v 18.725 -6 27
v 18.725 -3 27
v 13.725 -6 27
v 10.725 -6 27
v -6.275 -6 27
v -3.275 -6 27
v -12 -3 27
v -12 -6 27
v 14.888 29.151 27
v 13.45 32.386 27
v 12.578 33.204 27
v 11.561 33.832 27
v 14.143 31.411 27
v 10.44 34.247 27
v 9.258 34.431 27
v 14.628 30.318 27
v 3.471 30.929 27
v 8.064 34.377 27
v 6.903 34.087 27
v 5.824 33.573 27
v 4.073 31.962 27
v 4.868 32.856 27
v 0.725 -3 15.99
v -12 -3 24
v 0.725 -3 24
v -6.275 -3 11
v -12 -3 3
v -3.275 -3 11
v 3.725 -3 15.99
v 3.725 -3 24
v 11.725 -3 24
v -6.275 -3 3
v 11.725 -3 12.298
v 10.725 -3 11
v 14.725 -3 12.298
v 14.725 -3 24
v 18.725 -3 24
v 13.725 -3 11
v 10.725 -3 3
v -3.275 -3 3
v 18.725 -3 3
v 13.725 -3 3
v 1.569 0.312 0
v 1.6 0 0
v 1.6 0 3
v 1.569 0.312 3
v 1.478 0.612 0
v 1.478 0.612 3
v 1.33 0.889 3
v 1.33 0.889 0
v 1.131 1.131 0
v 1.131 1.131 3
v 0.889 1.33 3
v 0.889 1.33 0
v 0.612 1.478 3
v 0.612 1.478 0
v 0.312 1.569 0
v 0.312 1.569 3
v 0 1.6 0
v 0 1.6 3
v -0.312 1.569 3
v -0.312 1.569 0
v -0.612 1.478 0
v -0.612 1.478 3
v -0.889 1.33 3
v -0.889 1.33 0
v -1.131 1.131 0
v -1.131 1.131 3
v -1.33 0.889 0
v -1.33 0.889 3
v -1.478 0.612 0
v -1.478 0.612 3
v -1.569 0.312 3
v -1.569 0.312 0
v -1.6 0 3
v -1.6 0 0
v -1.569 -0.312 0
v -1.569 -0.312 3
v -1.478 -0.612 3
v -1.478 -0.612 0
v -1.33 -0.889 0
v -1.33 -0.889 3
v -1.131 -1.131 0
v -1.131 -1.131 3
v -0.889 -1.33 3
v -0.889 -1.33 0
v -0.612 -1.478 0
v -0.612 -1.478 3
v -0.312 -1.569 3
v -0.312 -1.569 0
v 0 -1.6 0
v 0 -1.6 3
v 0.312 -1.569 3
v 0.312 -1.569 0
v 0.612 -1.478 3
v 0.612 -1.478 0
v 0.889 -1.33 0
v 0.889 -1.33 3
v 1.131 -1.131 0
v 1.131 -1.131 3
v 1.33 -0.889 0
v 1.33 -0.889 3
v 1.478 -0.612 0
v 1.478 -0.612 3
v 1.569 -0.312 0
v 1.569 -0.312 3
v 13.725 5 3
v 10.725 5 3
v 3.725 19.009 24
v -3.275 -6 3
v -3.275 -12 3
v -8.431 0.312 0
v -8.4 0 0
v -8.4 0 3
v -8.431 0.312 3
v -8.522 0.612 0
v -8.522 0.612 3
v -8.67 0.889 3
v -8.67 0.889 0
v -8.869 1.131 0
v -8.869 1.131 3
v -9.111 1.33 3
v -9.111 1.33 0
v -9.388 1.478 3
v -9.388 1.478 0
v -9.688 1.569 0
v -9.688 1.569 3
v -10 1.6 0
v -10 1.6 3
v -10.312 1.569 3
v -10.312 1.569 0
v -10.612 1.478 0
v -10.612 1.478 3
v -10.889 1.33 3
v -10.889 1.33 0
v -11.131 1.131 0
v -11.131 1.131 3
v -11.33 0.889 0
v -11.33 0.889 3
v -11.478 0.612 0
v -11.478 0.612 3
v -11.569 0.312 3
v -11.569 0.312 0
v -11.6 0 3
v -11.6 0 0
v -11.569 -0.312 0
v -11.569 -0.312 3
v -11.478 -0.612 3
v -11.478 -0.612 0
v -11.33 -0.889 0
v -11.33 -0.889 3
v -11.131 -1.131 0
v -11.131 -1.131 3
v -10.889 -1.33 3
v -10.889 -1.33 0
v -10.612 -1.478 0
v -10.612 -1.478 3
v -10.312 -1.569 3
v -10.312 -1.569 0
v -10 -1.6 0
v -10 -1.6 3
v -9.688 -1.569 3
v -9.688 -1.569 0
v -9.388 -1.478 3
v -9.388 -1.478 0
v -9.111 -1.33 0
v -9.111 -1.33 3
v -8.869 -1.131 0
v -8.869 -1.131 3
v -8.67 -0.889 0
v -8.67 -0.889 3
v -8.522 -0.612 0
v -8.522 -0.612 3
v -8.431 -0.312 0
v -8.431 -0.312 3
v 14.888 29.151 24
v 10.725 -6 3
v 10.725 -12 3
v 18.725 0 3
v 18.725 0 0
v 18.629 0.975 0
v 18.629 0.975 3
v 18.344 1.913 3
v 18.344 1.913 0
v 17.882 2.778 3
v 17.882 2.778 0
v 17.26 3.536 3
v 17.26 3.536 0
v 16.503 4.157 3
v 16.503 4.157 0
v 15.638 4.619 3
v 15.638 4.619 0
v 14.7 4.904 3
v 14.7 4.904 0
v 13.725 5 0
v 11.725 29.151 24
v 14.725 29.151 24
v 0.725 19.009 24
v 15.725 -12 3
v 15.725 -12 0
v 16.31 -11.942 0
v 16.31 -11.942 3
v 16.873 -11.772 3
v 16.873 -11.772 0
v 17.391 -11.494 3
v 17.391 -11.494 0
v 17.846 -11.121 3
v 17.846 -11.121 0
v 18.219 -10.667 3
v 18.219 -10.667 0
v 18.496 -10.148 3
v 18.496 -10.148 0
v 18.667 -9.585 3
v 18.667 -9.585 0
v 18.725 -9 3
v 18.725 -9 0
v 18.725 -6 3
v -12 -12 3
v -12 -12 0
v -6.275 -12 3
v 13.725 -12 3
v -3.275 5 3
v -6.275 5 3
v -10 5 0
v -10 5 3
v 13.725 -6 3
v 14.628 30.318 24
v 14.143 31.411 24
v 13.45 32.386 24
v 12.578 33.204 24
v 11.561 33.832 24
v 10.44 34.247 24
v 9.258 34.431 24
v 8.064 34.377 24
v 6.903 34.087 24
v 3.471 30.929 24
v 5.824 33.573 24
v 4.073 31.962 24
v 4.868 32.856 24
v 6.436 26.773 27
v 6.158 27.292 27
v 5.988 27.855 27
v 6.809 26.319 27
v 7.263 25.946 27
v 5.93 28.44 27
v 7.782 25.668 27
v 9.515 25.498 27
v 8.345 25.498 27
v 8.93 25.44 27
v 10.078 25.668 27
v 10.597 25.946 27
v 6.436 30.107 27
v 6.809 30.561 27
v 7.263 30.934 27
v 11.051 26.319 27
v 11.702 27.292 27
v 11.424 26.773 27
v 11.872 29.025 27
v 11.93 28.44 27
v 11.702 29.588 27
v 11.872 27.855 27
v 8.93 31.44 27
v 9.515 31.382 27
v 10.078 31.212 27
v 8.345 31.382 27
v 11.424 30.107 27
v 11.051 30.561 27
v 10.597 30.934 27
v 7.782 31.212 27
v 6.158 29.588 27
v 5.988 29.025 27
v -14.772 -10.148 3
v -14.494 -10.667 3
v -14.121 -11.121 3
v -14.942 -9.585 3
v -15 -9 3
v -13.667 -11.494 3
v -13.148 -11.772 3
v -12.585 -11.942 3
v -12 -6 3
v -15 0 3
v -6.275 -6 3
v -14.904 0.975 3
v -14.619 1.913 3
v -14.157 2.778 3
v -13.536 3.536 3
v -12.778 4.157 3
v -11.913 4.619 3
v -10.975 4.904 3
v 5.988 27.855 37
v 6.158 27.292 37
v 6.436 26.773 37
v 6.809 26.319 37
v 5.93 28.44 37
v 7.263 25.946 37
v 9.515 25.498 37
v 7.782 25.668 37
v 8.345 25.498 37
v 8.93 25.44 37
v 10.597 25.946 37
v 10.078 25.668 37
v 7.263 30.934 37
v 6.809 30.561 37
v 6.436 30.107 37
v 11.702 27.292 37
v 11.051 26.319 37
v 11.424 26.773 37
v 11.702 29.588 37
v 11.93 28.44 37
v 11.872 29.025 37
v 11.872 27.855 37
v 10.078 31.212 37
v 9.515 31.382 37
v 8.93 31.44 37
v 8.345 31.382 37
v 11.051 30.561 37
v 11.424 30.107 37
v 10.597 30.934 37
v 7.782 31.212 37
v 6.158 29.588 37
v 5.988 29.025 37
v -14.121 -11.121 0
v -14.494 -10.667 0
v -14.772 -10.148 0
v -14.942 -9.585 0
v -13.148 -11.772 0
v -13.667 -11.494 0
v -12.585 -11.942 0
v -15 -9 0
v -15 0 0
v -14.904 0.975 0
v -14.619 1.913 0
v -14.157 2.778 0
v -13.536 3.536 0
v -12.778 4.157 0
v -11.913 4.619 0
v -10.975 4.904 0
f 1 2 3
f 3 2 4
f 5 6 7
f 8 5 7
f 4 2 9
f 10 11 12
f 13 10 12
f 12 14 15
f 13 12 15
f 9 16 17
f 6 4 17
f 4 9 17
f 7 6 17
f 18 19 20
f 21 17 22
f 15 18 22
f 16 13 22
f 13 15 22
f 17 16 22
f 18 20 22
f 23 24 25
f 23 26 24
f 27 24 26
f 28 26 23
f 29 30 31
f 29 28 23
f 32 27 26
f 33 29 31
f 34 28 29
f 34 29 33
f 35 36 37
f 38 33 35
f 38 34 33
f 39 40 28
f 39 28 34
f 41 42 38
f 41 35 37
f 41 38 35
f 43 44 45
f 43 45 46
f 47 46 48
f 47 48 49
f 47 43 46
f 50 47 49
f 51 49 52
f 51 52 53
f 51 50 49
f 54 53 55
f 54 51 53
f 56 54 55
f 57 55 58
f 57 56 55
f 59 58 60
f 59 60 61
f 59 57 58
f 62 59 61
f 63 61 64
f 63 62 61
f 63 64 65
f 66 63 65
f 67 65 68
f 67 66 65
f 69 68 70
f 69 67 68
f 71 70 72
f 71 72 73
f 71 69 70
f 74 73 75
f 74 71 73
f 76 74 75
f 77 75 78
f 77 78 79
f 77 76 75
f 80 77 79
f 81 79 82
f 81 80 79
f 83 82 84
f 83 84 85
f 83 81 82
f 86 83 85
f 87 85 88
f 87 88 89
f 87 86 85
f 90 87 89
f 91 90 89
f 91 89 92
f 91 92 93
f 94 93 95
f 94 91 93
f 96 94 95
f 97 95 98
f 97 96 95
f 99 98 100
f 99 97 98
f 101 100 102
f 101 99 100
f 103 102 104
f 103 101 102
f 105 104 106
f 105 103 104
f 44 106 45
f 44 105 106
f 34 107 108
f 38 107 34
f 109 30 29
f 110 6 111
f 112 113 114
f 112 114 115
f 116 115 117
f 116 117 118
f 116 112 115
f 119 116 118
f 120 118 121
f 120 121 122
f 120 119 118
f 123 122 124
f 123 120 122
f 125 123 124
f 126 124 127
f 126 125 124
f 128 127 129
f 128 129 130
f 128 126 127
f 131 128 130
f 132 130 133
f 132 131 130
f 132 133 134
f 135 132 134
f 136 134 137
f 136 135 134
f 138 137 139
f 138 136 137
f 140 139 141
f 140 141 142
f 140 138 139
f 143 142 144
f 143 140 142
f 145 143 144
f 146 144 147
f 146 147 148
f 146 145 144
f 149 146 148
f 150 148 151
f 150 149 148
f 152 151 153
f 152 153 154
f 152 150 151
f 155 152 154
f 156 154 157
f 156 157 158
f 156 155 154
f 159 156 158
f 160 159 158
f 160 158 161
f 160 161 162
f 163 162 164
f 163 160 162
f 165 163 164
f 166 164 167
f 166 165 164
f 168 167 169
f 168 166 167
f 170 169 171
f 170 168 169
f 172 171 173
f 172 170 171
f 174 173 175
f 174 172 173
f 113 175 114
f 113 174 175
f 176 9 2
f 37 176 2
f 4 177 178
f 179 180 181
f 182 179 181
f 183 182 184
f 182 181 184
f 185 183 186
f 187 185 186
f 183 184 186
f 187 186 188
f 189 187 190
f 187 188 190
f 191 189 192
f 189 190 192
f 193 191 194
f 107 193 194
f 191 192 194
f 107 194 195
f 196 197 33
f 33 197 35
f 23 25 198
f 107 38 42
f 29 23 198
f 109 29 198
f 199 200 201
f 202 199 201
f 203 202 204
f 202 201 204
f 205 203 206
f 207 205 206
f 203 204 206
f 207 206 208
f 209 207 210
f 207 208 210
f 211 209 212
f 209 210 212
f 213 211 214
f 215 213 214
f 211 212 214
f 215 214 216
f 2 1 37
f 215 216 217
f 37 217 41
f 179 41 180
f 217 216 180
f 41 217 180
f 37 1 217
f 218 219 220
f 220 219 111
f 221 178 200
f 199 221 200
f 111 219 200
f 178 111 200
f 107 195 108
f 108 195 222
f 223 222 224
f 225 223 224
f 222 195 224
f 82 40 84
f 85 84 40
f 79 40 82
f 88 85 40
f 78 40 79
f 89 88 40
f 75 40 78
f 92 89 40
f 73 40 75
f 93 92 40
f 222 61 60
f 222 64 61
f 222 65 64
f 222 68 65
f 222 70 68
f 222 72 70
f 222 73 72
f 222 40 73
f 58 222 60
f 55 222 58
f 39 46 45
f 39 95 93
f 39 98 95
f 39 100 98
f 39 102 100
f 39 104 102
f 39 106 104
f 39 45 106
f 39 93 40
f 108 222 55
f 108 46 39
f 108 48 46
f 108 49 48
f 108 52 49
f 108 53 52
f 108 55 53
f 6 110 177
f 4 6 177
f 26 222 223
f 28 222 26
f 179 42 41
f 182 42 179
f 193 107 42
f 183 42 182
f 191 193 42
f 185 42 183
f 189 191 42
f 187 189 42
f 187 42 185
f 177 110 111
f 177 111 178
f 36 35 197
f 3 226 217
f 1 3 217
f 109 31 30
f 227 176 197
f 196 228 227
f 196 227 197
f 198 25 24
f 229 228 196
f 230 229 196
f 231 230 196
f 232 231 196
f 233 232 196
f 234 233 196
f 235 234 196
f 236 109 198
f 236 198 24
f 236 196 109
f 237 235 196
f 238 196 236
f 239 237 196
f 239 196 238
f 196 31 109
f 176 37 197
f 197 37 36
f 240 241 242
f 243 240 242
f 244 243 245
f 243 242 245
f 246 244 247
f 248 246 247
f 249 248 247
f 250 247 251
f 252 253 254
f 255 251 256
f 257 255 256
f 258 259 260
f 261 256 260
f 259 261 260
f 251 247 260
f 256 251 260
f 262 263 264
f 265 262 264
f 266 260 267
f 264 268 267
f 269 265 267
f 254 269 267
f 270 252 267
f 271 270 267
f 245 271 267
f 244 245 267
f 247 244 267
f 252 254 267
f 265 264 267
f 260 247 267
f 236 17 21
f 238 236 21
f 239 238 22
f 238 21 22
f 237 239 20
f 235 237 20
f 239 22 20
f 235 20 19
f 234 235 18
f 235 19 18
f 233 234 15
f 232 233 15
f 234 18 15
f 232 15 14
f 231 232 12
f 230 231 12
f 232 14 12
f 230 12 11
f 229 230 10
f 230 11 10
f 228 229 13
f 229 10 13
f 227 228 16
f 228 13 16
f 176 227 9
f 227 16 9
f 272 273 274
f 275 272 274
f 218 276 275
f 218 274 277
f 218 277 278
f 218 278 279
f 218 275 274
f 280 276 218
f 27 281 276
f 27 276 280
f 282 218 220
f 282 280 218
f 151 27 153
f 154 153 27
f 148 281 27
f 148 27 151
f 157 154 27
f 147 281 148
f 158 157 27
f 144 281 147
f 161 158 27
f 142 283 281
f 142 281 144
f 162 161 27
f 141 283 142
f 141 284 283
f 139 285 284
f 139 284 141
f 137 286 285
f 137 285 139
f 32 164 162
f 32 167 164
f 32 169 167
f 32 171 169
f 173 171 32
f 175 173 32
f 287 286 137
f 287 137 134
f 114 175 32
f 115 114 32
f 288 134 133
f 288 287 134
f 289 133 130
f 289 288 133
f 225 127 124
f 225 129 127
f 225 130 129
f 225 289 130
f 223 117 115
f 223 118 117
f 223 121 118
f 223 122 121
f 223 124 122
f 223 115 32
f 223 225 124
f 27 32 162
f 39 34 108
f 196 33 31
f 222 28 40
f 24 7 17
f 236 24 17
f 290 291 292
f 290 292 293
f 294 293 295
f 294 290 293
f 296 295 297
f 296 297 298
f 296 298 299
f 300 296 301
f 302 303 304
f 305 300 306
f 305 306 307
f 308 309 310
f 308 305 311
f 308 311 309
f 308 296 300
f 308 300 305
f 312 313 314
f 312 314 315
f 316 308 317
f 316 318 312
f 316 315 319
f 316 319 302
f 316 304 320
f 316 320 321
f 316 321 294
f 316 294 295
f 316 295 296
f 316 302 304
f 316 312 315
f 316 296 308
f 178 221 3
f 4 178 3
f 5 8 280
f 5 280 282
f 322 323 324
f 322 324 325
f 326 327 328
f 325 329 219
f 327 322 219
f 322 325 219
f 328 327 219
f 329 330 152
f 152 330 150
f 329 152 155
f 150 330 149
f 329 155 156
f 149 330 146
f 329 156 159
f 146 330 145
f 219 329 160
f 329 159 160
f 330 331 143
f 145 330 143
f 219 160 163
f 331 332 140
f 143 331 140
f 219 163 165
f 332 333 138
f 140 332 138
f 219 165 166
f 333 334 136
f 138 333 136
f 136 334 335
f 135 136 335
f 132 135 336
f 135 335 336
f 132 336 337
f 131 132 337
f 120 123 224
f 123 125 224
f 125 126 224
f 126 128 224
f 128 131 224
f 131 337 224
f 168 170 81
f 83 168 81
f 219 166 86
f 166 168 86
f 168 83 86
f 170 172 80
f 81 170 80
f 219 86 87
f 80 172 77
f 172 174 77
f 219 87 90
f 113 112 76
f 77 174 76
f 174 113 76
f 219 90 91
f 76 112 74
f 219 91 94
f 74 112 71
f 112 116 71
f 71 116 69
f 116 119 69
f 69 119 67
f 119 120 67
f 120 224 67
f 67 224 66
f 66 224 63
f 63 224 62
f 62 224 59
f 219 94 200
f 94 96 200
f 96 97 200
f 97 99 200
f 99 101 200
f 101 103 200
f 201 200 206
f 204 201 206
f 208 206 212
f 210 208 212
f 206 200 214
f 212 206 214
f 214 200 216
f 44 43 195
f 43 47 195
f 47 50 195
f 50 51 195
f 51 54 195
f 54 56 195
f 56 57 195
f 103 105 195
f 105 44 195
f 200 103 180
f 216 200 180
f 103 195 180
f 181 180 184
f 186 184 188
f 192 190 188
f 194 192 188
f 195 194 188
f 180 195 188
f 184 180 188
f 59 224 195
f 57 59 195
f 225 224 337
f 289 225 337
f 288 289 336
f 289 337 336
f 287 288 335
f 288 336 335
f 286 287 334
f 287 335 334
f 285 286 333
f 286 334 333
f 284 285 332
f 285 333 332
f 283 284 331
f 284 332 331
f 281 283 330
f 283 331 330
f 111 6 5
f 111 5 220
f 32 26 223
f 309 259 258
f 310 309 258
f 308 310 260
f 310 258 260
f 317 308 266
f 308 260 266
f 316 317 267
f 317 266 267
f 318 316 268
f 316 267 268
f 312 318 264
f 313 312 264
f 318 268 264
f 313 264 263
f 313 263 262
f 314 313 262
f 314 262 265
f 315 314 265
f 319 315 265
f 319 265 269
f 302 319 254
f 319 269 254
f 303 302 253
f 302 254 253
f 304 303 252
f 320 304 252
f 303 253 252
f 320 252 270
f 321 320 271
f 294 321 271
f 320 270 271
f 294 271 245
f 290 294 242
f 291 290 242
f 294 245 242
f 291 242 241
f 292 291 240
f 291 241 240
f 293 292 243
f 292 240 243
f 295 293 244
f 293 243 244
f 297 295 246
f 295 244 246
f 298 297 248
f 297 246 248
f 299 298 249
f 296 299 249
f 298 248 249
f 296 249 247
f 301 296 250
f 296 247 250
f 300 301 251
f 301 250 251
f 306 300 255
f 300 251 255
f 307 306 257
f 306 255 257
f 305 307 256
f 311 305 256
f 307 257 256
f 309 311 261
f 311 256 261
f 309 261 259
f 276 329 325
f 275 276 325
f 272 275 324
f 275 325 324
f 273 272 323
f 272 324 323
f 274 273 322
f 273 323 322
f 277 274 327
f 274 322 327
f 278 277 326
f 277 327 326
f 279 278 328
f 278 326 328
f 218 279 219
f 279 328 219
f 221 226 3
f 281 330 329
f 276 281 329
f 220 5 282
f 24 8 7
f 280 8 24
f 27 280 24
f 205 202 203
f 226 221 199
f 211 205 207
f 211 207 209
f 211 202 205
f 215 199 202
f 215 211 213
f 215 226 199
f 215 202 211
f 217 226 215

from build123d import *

# Parameters (mm, degrees)
SKETCH_1_R      = 1.6
EXTRUDE_1_DEPTH = 3
SKETCH_2_W      = 30.724754664
SKETCH_2_H      = 3
EXTRUDE_2_DEPTH = 24
SKETCH_4_R      = 3
EXTRUDE_3_DEPTH = 10
SKETCH_5_R      = 6
SKETCH_5_R_2    = 3
EXTRUDE_4_DEPTH = 3
EXTRUDE_START   = -4
EXTRUDE_5_DEPTH = 3
EXTRUDE_START_2 = -18
EXTRUDE_6_DEPTH = 3
EXTRUDE_START_3 = -5
EXTRUDE_7_DEPTH = 3
EXTRUDE_START_4 = -22
EXTRUDE_8_DEPTH = 3


with BuildPart() as part:
    # 草图1 → 凸台-拉伸1 (new body)
    with BuildSketch(Plane.XY):
        with BuildLine():
            ThreePointArc((-10, 5), (-13.535533906, 3.535533906), (-15, 0))
            Line((-15, 0), (-15, -9))
            ThreePointArc((-15, -9), (-14.121320344, -11.121320344), (-12, -12))
            Line((-12, -12), (15.724754664, -12))
            ThreePointArc((15.724754664, -12), (17.846075007, -11.121320344), (18.724754664, -9))
            Line((18.724754664, -9), (18.724754664, 0))
            ThreePointArc((18.724754664, 0), (17.26028857, 3.535533906), (13.724754664, 5))
            Line((13.724754664, 5), (-10, 5))
        make_face()
        with Locations((-10, 0)):
            Circle(SKETCH_1_R, mode=Mode.SUBTRACT)
        Circle(SKETCH_1_R, mode=Mode.SUBTRACT)
    extrude(amount=EXTRUDE_1_DEPTH)

    # 草图2 → 凸台-拉伸2 (add)
    with BuildSketch(Plane.XY.offset(3)):
        with Locations((3.362377332, -4.5)):
            Rectangle(SKETCH_2_W, SKETCH_2_H)
    extrude(amount=EXTRUDE_2_DEPTH)

    # 草图5 → 凸台-拉伸4 (add)
    # profile 1 of 3: a face of its own
    with BuildSketch(Plane(origin=(0, 0, 27), x_dir=(-1, 0, 0), z_dir=(0, 0, -1))):
        with BuildLine():
            Line((12, -3), (-3.470735188, 30.929262484))
            ThreePointArc((-3.470735188, 30.929262484), (-3.066741995, 29.713658339), (-2.93, 28.44))
            ThreePointArc((-2.93, 28.44), (-9.28613724, 22.450578804), (-14.887722089, 29.151018645))
            Line((-14.887722089, 29.151018645), (-18.724754664, -3))
            Line((-18.724754664, -3), (12, -3))
        make_face()
    # profile 2 of 3: a face of its own
    with BuildSketch(Plane(origin=(0, 0, 27), x_dir=(-1, 0, 0), z_dir=(0, 0, -1))):
        with Locations((-8.93, 28.44)):
            Circle(SKETCH_5_R)
        with Locations(Location((-8.93, 28.44, 0), (0, 0, 180))):
            Circle(SKETCH_5_R_2, mode=Mode.SUBTRACT)
    # profile 3 of 3: a face of its own
    with BuildSketch(Plane(origin=(0, 0, 27), x_dir=(-1, 0, 0), z_dir=(0, 0, -1))):
        with Locations(Location((-8.93, 28.44, 0), (0, 0, 180))):
            Circle(SKETCH_5_R_2)
    extrude(amount=EXTRUDE_4_DEPTH)

    # 草图6 → 凸台-拉伸5 (add)
    with BuildSketch(Plane(origin=(18.724754664, 0, 0), x_dir=(0, 0, -1), z_dir=(1, 0, 0)).offset(EXTRUDE_START)):
        Polygon((-24, 29.151018645), (-12.297986212, -3), (-24, -3), align=None)
    extrude(amount=-EXTRUDE_5_DEPTH)

    # 草图7 → 凸台-拉伸6 (add)
    with BuildSketch(Plane(origin=(18.724754664, 0, 0), x_dir=(0, 0, -1), z_dir=(1, 0, 0)).offset(EXTRUDE_START_2)):
        Polygon((-15.989522991, -3), (-24, 19.008604701), (-24, -3), align=None)
    extrude(amount=EXTRUDE_6_DEPTH)

    # 草图8 → 凸台-拉伸7 (add)
    with BuildSketch(Plane(origin=(18.724754664, 0, 0), x_dir=(0, 0, -1), z_dir=(1, 0, 0)).offset(EXTRUDE_START_3)):
        Polygon((-3, 5), (-11, -3), (-3, -3), align=None)
        Polygon((-3, -12), (-27, -6), (-3, -6), align=None)
    extrude(amount=-EXTRUDE_7_DEPTH)

    # 草图9 → 凸台-拉伸8 (add)
    with BuildSketch(Plane(origin=(18.724754664, 0, 0), x_dir=(0, 0, -1), z_dir=(1, 0, 0)).offset(EXTRUDE_START_4)):
        Polygon((-27, -6), (-3, -12), (-3, -6), align=None)
        Polygon((-3, 5), (-11, -3), (-3, -3), align=None)
    extrude(amount=-EXTRUDE_8_DEPTH)


with BuildPart() as body_2:
    # 草图4 → 凸台-拉伸3 (new body)
    with BuildSketch(Plane.XY.offset(27)):
        with Locations((8.93, 28.44)):
            Circle(SKETCH_4_R)
    extrude(amount=EXTRUDE_3_DEPTH)


solid = Compound([part.part, body_2.part])
